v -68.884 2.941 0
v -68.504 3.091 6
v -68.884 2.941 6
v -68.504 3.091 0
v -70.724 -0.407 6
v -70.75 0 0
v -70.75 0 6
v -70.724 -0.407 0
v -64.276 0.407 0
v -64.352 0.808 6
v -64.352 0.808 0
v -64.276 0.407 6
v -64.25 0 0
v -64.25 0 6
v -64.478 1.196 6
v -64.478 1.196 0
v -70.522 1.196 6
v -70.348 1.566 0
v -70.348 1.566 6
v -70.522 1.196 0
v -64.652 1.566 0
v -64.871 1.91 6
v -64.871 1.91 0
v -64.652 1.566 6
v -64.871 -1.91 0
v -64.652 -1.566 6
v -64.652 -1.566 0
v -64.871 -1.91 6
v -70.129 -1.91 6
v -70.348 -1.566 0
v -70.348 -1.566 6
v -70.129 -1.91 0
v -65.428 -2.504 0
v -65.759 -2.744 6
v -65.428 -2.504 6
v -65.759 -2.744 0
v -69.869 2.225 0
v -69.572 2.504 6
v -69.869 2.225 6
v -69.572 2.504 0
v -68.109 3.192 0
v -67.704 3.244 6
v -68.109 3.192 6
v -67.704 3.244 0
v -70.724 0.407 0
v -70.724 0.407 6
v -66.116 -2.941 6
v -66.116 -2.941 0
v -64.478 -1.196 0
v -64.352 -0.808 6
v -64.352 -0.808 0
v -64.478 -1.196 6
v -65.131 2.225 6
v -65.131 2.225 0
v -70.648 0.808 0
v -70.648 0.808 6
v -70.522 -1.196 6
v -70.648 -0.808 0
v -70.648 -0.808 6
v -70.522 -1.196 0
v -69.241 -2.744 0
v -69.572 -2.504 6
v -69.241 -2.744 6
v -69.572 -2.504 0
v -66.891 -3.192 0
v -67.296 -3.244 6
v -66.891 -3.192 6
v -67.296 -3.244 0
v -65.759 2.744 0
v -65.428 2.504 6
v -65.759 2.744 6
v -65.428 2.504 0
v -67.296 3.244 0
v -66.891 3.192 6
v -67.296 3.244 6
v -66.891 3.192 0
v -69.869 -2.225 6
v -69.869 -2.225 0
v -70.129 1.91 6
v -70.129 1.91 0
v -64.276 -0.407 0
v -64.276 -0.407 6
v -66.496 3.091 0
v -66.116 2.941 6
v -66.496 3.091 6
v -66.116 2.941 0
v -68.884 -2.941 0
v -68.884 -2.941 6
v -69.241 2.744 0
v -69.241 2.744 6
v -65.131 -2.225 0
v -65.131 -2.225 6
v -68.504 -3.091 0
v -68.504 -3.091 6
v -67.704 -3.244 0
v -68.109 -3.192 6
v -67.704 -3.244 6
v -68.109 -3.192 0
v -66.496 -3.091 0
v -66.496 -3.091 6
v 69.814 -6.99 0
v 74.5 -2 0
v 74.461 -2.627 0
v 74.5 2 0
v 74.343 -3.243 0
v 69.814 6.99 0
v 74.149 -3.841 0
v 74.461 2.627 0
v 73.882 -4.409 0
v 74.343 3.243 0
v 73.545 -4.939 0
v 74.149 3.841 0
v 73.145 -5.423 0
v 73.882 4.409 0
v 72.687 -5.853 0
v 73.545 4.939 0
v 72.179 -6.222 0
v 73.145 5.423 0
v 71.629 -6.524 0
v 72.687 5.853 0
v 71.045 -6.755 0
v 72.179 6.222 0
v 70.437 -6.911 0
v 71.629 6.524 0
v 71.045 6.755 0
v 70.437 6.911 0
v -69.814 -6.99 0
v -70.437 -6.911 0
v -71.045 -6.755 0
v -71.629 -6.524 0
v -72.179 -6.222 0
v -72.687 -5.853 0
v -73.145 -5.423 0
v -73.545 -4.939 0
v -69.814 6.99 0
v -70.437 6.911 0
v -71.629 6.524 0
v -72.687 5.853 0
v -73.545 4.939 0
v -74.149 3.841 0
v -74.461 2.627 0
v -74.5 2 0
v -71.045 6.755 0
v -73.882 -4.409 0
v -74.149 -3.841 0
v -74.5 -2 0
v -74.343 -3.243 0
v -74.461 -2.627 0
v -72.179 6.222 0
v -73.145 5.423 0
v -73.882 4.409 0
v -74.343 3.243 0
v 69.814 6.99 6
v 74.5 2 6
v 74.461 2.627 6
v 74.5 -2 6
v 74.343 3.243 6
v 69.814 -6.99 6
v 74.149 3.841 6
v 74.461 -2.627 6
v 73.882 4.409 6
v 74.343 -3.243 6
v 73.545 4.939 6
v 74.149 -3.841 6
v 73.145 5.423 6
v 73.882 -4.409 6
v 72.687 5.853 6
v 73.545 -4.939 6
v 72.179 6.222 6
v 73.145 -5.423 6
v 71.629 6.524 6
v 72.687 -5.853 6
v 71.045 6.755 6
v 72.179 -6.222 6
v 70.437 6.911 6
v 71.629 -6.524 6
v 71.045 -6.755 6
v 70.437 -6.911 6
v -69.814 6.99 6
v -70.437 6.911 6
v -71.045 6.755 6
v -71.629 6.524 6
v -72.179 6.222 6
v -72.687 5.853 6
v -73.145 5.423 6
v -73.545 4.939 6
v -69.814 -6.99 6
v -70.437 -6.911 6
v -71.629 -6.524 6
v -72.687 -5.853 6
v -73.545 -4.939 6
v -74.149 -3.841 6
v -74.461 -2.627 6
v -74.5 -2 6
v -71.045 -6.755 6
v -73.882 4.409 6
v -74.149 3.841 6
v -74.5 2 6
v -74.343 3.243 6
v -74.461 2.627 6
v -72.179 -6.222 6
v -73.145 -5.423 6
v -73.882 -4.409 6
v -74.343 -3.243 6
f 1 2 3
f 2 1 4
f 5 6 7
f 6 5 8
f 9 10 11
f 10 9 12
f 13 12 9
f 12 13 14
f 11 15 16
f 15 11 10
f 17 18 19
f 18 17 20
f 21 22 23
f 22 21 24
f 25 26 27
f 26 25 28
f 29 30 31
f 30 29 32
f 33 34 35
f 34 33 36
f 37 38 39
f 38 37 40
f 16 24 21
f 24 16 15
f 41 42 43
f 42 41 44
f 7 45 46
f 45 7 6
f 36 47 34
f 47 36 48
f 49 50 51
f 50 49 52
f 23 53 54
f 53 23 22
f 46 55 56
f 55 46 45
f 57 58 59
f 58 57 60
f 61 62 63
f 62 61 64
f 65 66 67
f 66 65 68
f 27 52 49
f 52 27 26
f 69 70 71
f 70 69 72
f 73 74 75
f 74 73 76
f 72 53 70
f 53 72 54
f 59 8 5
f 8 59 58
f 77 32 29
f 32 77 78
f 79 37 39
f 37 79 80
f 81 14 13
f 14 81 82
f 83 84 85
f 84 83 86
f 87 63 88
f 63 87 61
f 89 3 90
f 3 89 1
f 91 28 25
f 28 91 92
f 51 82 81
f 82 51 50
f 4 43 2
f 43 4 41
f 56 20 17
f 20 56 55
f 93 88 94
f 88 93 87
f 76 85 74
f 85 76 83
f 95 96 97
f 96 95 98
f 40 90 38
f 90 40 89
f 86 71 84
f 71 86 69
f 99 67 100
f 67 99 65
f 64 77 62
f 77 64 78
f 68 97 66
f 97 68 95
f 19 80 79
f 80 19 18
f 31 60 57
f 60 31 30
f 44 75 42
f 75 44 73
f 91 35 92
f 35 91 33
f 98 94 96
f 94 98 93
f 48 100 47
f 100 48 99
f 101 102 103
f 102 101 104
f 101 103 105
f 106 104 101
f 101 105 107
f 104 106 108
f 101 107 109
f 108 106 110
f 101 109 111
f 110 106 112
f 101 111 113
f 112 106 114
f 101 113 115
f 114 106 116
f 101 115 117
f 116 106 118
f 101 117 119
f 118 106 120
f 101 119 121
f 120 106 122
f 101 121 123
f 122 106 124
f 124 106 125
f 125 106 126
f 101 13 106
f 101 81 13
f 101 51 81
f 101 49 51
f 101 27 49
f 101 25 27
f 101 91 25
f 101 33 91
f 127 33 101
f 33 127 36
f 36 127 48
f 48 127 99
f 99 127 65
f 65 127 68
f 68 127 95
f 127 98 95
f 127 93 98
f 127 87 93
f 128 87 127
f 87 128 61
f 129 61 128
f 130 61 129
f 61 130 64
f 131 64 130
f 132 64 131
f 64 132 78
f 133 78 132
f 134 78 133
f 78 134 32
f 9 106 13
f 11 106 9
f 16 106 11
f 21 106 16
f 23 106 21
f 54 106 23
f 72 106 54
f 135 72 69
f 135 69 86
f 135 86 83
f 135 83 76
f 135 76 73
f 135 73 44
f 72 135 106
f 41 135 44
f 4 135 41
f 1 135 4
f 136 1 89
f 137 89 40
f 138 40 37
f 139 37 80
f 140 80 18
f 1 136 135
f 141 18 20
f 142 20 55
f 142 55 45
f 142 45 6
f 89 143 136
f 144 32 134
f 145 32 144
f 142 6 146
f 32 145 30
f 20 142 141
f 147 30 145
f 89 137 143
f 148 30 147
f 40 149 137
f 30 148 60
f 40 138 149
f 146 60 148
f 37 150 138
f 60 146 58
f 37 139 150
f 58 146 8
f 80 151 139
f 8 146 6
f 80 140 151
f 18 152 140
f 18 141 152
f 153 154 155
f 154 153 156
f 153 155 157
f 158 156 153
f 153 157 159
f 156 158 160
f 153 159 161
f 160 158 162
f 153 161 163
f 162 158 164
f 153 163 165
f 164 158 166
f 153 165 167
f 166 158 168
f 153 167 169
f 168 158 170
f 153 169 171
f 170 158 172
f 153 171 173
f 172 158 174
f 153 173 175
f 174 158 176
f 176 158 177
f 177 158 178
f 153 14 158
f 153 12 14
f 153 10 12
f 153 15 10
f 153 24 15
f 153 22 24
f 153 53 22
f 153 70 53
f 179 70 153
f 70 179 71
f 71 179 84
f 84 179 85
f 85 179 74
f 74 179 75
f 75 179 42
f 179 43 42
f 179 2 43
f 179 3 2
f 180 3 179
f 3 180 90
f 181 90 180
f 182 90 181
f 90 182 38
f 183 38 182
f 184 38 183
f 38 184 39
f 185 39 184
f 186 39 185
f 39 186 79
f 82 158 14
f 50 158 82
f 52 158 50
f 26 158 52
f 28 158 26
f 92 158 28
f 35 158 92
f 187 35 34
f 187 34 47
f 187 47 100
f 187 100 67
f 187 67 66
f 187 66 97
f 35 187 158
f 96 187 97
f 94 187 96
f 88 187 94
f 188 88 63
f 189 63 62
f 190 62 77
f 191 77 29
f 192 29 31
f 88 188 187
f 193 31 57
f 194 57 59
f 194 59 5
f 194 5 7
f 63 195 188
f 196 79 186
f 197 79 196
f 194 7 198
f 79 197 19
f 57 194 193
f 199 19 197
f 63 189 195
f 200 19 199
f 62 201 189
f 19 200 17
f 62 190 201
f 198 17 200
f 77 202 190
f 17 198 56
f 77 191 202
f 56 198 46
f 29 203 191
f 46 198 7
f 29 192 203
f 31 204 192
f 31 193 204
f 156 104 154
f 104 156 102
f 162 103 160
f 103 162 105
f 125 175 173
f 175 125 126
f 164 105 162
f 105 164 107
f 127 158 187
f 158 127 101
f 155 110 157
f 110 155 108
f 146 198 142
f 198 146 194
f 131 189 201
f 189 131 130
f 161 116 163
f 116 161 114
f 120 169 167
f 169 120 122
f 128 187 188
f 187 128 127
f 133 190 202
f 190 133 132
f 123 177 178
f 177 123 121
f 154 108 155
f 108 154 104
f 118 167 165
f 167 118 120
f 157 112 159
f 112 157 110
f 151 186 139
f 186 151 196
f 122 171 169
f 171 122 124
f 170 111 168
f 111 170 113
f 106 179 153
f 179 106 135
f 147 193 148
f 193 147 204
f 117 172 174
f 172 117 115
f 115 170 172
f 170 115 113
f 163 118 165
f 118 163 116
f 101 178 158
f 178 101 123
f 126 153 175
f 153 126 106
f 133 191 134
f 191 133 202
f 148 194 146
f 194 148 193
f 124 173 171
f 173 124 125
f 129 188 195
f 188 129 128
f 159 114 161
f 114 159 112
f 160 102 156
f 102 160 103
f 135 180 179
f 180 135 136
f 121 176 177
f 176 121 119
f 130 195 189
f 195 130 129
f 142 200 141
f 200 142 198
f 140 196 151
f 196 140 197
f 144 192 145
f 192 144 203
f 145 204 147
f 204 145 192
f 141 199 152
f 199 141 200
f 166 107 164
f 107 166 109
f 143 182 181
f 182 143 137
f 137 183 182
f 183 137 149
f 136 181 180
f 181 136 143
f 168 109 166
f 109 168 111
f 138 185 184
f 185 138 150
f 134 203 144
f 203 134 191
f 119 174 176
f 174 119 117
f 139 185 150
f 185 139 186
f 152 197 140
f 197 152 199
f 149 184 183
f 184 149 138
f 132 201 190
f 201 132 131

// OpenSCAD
$fn = 50;


difference() {
	union() {
		hull() {
			translate(v = [-69.5000000000, 2.0000000000, 0]) {
				cylinder(h = 6, r = 5);
			}
			translate(v = [69.5000000000, 2.0000000000, 0]) {
				cylinder(h = 6, r = 5);
			}
			translate(v = [-69.5000000000, -2.0000000000, 0]) {
				cylinder(h = 6, r = 5);
			}
			translate(v = [69.5000000000, -2.0000000000, 0]) {
				cylinder(h = 6, r = 5);
			}
		}
	}
	union() {
		translate(v = [-67.5000000000, 0.0000000000, 0]) {
			cylinder(h = 6, r = 3.2500000000);
		}
		translate(v = [-67.5000000000, 0.0000000000, 0]) {
			cylinder(h = 6, r = 1.8000000000);
		}
		translate(v = [-67.5000000000, 0.0000000000, 0]) {
			cylinder(h = 6, r = 1.8000000000);
		}
		translate(v = [-67.5000000000, 0.0000000000, 0]) {
			cylinder(h = 6, r = 1.8000000000);
		}
	}
}
